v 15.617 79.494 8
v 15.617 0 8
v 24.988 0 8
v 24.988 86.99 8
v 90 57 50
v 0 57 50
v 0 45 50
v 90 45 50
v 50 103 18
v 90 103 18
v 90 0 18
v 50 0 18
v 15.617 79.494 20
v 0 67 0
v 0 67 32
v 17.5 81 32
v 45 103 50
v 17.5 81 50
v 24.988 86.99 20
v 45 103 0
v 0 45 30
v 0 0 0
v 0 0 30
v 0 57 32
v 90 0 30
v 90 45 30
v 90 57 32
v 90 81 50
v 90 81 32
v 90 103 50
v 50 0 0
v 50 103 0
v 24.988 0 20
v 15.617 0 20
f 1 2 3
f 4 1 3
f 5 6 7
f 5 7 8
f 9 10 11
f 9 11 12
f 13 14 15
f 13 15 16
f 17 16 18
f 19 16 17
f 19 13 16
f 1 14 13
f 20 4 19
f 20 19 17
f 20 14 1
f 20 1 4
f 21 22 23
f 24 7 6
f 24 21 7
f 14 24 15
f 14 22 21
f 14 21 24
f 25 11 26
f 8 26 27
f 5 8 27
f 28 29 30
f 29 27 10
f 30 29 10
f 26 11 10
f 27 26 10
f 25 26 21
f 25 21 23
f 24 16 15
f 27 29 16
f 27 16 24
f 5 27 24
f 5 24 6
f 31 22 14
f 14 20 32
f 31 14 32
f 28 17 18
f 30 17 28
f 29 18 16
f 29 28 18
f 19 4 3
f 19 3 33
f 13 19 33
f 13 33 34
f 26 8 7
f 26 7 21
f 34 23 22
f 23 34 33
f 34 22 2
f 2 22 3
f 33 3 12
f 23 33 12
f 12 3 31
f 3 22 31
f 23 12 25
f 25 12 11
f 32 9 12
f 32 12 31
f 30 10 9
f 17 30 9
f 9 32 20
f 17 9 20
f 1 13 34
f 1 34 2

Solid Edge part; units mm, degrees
sketch "Sketch1" plane through (0, 0, 0) normal (0, 0, 1) x (1, 0, 0)
  line L0 (90, 0) -> (90, 103)
  line L1 (90, 103) -> (45, 103)
  line L2 (0, 67) -> (45, 103)
  line L3 (0, 0) -> (0, 67)
  line L4 (0, 0) -> (90, 0)
extrude "Protrusion1" add sketch "Sketch1" along normal blind 50
sketch "Sketch2" plane through (90, 51.5, 25) normal (1, 0, 0) x (0, 1, 0)
  line L0 (5.5, 7) -> (5.5, 25)
  line L1 (29.5, 7) -> (5.5, 7)
  line L2 (29.5, 25) -> (29.5, 7)
extrude "Cutout1" cut sketch "Sketch2" against normal up to next material side at (90, 57.05, 41)
sketch "Sketch3" plane through (67.5, 103, 25) normal (0, 1, 0) x (0, 0, -1)
  line L0 (7, -22.5) -> (7, 17.5)
  line L1 (7, 17.5) -> (25, 17.5)
extrude "Cutout2" cut sketch "Sketch3" against normal up to next material side at (70, 103, 17.95)
sketch "Sketch4" plane through (67.5, 103, 25) normal (0, 1, 0) x (1, 0, 0)
  line L0 (-42.5122, 5) -> (-51.8826, 5)
  line L1 (-51.8826, 5) -> (-51.8826, 17)
  line L2 (-51.8826, 17) -> (-42.5122, 17)
  line L3 (-42.5122, 17) -> (-42.5122, 5)
extrude "Cutout3" cut sketch "Sketch4" against normal up to next
sketch "Sketch5" plane through (90, 51.5, 25) normal (1, 0, 0) x (0, 1, 0)
  line L0 (-6.5, 5) -> (-51.5, 5)
  line L1 (-6.5, 25) -> (-6.5, 5)
extrude "Cutout4" cut sketch "Sketch5" against normal up to next material side at (90, 22.5, 30.05)
